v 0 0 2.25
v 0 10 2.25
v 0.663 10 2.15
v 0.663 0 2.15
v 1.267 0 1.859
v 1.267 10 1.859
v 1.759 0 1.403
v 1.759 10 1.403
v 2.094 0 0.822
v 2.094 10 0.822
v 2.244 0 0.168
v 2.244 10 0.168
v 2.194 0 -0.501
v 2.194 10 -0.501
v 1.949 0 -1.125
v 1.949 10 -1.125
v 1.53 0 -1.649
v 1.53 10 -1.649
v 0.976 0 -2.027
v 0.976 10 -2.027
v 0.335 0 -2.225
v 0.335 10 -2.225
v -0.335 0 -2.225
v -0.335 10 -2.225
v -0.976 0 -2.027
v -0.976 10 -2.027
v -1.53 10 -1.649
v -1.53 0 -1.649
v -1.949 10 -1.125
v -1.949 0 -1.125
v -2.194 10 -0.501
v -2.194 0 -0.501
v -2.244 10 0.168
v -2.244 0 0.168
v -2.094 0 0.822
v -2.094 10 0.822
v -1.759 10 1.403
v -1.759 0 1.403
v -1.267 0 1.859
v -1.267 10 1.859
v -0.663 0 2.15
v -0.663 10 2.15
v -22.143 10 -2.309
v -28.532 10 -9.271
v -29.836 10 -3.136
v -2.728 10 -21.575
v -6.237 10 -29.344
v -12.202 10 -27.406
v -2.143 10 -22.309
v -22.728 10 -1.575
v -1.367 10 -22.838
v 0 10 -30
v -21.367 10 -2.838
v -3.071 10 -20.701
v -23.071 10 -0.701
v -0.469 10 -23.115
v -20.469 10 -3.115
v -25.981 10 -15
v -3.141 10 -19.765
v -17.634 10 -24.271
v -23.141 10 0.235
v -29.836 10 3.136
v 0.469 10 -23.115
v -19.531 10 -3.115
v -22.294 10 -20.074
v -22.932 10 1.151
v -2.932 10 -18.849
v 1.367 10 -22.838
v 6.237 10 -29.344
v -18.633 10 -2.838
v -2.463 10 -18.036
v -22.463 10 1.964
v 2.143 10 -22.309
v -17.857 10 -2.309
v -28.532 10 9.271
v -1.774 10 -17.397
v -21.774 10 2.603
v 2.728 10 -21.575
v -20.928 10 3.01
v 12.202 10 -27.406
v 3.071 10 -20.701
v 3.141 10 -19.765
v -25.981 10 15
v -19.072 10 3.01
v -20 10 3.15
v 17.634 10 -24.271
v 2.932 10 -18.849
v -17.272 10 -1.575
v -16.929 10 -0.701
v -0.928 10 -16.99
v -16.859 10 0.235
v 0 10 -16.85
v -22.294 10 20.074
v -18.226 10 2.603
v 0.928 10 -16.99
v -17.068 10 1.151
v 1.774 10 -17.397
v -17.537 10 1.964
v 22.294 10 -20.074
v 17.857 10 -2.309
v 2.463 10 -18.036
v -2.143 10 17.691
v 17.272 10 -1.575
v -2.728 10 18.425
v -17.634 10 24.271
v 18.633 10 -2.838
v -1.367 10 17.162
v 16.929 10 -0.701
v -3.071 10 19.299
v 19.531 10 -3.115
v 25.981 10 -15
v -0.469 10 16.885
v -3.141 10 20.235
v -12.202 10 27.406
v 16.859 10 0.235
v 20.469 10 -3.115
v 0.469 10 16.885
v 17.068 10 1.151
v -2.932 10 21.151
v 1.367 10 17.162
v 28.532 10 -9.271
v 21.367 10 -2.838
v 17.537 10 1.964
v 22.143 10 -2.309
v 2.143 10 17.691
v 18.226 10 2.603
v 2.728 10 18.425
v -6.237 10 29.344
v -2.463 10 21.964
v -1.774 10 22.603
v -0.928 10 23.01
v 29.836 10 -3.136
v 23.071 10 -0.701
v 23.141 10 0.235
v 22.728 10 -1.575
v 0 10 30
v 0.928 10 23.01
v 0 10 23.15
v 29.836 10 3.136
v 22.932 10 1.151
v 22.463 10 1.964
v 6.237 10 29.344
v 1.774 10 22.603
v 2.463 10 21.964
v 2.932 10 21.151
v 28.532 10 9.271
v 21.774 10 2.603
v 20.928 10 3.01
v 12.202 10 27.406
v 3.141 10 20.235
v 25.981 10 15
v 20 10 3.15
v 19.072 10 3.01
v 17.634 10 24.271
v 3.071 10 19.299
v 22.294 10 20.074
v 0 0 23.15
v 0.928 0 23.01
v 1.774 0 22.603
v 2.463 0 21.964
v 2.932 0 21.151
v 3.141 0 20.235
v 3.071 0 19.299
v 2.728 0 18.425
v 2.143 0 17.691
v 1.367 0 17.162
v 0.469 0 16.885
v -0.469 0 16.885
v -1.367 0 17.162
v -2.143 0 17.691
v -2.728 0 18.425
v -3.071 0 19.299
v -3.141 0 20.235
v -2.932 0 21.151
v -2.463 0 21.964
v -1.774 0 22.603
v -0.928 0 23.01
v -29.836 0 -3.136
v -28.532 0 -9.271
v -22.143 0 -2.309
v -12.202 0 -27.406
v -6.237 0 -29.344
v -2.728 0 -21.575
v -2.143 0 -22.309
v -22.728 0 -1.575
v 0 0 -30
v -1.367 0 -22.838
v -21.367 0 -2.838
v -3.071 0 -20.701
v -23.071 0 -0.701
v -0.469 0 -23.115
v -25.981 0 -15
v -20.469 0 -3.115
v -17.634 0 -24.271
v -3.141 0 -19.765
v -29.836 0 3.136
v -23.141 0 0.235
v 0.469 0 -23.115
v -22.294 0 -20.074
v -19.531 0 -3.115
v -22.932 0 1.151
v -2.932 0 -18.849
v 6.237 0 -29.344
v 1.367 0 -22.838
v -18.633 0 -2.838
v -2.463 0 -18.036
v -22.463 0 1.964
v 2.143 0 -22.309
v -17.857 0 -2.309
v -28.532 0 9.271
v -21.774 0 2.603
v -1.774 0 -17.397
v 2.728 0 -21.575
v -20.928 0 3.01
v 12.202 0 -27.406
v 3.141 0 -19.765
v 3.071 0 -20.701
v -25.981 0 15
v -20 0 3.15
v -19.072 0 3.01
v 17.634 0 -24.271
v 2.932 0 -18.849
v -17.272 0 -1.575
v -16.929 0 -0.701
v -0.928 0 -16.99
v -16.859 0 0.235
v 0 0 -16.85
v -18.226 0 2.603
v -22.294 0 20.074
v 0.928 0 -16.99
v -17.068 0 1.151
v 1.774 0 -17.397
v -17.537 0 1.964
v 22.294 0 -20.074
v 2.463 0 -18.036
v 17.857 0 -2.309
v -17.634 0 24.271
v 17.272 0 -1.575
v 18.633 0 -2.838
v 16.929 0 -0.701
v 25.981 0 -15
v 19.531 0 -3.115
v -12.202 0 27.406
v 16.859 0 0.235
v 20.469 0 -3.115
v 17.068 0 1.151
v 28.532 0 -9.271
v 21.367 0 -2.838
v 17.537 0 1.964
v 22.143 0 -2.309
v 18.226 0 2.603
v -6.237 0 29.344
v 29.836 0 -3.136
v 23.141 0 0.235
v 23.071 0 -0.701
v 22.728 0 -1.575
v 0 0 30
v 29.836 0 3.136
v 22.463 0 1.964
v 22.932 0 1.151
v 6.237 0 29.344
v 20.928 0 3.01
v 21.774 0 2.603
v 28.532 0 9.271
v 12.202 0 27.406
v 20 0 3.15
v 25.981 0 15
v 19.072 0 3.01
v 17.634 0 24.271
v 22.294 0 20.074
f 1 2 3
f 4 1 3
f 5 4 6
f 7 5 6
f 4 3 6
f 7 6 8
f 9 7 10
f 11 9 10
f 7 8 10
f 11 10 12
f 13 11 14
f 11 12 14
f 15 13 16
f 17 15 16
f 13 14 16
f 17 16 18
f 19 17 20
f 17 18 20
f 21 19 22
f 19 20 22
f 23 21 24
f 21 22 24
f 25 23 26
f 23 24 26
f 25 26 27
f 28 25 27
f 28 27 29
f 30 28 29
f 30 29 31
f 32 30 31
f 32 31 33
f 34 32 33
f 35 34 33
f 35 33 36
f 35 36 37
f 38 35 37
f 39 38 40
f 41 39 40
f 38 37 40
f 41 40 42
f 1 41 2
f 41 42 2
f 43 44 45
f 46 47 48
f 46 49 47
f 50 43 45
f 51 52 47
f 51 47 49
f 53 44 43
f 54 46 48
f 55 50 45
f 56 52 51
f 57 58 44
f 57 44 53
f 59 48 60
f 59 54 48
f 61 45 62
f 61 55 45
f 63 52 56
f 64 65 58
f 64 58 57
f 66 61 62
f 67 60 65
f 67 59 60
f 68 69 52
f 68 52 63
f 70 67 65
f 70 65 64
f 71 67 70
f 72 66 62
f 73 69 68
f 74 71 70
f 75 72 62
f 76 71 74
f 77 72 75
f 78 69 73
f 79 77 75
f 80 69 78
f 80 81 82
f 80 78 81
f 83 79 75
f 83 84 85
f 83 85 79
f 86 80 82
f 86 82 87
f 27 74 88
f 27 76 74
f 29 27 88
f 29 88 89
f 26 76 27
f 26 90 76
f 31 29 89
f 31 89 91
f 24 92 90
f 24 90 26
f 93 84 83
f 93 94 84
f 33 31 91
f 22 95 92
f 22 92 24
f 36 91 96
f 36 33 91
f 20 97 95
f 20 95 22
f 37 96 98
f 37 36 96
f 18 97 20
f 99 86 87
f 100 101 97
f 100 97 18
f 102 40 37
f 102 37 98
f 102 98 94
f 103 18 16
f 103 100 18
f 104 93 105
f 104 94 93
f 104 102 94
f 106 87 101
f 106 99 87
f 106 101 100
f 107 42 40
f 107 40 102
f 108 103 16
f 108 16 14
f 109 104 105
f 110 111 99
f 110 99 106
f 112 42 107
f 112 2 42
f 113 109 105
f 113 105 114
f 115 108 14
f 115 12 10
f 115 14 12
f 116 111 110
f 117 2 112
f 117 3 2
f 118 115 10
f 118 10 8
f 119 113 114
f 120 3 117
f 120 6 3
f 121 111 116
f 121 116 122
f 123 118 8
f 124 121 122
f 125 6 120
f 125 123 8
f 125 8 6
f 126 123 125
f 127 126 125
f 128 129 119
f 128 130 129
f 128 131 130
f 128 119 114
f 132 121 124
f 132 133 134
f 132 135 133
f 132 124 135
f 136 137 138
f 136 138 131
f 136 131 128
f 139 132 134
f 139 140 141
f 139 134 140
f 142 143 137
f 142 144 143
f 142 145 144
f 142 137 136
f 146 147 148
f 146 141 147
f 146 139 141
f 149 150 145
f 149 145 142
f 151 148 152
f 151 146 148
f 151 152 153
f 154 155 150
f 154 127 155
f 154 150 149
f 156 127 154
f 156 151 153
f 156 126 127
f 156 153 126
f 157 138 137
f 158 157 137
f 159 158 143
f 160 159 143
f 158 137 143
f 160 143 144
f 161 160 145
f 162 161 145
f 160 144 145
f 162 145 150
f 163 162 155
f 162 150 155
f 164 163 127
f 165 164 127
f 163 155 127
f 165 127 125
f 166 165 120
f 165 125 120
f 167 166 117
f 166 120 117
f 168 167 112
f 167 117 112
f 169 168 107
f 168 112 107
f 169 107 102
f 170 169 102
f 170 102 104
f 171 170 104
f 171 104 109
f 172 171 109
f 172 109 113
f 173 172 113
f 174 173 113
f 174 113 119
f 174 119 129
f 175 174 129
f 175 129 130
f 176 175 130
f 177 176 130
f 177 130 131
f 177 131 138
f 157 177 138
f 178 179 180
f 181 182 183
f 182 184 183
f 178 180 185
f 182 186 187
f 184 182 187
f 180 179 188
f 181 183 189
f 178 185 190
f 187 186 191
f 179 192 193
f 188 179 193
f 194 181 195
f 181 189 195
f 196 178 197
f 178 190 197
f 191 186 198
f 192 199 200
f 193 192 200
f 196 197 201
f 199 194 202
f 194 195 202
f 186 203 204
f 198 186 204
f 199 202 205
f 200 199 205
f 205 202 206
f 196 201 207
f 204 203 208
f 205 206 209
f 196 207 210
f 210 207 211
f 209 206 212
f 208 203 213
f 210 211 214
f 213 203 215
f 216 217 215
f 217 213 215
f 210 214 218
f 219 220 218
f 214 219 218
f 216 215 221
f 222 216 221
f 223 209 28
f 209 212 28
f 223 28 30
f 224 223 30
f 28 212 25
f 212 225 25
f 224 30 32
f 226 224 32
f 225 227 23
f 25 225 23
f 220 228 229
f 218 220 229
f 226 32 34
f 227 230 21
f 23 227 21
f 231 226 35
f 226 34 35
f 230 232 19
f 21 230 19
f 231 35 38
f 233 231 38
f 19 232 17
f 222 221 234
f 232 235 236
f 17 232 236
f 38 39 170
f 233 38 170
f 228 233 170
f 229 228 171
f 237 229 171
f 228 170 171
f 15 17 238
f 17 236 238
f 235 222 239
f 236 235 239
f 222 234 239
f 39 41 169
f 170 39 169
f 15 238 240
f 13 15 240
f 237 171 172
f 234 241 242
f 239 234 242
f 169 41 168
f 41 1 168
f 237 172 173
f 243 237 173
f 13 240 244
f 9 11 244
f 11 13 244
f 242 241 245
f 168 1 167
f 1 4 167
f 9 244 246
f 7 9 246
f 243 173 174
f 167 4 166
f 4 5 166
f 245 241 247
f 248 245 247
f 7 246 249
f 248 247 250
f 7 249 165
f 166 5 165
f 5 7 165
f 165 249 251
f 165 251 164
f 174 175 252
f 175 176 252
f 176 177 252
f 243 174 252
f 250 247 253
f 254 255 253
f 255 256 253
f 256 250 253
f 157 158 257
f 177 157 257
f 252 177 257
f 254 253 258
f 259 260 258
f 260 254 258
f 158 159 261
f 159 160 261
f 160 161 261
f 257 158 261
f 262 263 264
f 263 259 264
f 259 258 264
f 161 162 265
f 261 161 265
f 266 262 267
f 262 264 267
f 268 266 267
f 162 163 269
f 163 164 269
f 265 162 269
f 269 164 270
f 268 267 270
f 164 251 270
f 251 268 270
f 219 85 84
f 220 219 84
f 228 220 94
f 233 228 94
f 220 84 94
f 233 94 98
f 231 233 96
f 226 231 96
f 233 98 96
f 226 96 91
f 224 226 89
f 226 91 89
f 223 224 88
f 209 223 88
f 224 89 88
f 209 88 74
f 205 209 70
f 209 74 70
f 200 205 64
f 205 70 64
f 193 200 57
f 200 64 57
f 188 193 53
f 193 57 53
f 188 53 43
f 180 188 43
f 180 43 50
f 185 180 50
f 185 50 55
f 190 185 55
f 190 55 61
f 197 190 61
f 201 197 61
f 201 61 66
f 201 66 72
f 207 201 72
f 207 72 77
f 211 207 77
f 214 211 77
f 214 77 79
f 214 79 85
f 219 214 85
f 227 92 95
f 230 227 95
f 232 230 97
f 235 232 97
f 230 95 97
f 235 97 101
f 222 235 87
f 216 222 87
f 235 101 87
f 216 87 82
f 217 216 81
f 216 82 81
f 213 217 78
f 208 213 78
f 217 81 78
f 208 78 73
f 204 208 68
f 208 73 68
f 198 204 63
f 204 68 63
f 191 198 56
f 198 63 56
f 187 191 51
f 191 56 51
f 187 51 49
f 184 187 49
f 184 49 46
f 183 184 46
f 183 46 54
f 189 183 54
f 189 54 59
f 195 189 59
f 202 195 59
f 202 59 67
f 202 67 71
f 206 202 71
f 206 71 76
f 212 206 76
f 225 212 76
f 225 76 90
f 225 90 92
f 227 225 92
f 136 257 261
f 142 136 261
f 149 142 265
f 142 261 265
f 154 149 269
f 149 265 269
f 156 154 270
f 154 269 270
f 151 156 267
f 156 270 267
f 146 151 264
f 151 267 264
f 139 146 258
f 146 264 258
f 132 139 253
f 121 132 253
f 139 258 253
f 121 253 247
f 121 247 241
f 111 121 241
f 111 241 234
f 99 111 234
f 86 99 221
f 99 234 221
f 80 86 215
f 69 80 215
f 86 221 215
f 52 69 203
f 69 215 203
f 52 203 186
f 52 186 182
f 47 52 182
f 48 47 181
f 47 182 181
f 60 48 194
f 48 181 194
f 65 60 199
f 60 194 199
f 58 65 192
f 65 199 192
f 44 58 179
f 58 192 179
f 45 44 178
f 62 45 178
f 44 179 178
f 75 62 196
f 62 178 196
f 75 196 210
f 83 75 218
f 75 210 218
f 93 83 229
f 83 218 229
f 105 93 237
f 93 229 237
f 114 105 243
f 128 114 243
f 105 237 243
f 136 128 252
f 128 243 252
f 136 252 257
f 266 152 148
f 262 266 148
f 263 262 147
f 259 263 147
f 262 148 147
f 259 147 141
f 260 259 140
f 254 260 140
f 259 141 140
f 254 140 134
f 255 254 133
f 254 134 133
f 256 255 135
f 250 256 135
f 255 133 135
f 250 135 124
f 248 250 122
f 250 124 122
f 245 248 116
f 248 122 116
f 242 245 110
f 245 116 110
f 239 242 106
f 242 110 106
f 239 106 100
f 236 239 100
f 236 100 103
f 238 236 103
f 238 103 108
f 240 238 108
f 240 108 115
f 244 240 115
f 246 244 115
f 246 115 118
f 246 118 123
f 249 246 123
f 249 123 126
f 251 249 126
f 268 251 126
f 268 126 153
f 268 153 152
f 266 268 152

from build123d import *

# Parameters (mm, degrees)
SKETCH1_R           = 30
BOSS_EXTRUDE1_DEPTH = 10
SKETCH3_R           = 3.15
CUT_EXTRUDE2_DEPTH  = 44.588989435
SKETCH4_R           = 2.25
CUT_EXTRUDE3_DEPTH  = 10


with BuildPart() as part:
    # Sketch1 → Boss-Extrude1 (new body)
    with BuildSketch(Plane(origin=(0, 0, 0), x_dir=(1, 0, 0), z_dir=(0, 1, 0))):
        with Locations(Location((0, 0, 0), (0, 0, 270))):
            Circle(SKETCH1_R)
    extrude(amount=BOSS_EXTRUDE1_DEPTH)

    # Sketch3 → Cut-Extrude2 (cut, through all)
    with BuildSketch(Plane(origin=(0, 10, 0), x_dir=(1, 0, 0), z_dir=(0, 1, 0))):
        with Locations(Location((0, 20, 0), (0, 0, 270))):
            Circle(SKETCH3_R)
        with Locations(Location((20, 0, 0), (0, 0, 270))):
            Circle(SKETCH3_R)
        with Locations(Location((0, -20, 0), (0, 0, 270))):
            Circle(SKETCH3_R)
        with Locations(Location((-20, 0, 0), (0, 0, 270))):
            Circle(SKETCH3_R)
    extrude(amount=-CUT_EXTRUDE2_DEPTH, mode=Mode.SUBTRACT)

    # Sketch4 → Cut-Extrude3 (cut)
    with BuildSketch(Plane(origin=(0, 10, 0), x_dir=(1, 0, 0), z_dir=(0, 1, 0))):
        with Locations(Location((0, 0, 0), (0, 0, 270))):
            Circle(SKETCH4_R)
    extrude(amount=-CUT_EXTRUDE3_DEPTH, mode=Mode.SUBTRACT)


solid = part.part
